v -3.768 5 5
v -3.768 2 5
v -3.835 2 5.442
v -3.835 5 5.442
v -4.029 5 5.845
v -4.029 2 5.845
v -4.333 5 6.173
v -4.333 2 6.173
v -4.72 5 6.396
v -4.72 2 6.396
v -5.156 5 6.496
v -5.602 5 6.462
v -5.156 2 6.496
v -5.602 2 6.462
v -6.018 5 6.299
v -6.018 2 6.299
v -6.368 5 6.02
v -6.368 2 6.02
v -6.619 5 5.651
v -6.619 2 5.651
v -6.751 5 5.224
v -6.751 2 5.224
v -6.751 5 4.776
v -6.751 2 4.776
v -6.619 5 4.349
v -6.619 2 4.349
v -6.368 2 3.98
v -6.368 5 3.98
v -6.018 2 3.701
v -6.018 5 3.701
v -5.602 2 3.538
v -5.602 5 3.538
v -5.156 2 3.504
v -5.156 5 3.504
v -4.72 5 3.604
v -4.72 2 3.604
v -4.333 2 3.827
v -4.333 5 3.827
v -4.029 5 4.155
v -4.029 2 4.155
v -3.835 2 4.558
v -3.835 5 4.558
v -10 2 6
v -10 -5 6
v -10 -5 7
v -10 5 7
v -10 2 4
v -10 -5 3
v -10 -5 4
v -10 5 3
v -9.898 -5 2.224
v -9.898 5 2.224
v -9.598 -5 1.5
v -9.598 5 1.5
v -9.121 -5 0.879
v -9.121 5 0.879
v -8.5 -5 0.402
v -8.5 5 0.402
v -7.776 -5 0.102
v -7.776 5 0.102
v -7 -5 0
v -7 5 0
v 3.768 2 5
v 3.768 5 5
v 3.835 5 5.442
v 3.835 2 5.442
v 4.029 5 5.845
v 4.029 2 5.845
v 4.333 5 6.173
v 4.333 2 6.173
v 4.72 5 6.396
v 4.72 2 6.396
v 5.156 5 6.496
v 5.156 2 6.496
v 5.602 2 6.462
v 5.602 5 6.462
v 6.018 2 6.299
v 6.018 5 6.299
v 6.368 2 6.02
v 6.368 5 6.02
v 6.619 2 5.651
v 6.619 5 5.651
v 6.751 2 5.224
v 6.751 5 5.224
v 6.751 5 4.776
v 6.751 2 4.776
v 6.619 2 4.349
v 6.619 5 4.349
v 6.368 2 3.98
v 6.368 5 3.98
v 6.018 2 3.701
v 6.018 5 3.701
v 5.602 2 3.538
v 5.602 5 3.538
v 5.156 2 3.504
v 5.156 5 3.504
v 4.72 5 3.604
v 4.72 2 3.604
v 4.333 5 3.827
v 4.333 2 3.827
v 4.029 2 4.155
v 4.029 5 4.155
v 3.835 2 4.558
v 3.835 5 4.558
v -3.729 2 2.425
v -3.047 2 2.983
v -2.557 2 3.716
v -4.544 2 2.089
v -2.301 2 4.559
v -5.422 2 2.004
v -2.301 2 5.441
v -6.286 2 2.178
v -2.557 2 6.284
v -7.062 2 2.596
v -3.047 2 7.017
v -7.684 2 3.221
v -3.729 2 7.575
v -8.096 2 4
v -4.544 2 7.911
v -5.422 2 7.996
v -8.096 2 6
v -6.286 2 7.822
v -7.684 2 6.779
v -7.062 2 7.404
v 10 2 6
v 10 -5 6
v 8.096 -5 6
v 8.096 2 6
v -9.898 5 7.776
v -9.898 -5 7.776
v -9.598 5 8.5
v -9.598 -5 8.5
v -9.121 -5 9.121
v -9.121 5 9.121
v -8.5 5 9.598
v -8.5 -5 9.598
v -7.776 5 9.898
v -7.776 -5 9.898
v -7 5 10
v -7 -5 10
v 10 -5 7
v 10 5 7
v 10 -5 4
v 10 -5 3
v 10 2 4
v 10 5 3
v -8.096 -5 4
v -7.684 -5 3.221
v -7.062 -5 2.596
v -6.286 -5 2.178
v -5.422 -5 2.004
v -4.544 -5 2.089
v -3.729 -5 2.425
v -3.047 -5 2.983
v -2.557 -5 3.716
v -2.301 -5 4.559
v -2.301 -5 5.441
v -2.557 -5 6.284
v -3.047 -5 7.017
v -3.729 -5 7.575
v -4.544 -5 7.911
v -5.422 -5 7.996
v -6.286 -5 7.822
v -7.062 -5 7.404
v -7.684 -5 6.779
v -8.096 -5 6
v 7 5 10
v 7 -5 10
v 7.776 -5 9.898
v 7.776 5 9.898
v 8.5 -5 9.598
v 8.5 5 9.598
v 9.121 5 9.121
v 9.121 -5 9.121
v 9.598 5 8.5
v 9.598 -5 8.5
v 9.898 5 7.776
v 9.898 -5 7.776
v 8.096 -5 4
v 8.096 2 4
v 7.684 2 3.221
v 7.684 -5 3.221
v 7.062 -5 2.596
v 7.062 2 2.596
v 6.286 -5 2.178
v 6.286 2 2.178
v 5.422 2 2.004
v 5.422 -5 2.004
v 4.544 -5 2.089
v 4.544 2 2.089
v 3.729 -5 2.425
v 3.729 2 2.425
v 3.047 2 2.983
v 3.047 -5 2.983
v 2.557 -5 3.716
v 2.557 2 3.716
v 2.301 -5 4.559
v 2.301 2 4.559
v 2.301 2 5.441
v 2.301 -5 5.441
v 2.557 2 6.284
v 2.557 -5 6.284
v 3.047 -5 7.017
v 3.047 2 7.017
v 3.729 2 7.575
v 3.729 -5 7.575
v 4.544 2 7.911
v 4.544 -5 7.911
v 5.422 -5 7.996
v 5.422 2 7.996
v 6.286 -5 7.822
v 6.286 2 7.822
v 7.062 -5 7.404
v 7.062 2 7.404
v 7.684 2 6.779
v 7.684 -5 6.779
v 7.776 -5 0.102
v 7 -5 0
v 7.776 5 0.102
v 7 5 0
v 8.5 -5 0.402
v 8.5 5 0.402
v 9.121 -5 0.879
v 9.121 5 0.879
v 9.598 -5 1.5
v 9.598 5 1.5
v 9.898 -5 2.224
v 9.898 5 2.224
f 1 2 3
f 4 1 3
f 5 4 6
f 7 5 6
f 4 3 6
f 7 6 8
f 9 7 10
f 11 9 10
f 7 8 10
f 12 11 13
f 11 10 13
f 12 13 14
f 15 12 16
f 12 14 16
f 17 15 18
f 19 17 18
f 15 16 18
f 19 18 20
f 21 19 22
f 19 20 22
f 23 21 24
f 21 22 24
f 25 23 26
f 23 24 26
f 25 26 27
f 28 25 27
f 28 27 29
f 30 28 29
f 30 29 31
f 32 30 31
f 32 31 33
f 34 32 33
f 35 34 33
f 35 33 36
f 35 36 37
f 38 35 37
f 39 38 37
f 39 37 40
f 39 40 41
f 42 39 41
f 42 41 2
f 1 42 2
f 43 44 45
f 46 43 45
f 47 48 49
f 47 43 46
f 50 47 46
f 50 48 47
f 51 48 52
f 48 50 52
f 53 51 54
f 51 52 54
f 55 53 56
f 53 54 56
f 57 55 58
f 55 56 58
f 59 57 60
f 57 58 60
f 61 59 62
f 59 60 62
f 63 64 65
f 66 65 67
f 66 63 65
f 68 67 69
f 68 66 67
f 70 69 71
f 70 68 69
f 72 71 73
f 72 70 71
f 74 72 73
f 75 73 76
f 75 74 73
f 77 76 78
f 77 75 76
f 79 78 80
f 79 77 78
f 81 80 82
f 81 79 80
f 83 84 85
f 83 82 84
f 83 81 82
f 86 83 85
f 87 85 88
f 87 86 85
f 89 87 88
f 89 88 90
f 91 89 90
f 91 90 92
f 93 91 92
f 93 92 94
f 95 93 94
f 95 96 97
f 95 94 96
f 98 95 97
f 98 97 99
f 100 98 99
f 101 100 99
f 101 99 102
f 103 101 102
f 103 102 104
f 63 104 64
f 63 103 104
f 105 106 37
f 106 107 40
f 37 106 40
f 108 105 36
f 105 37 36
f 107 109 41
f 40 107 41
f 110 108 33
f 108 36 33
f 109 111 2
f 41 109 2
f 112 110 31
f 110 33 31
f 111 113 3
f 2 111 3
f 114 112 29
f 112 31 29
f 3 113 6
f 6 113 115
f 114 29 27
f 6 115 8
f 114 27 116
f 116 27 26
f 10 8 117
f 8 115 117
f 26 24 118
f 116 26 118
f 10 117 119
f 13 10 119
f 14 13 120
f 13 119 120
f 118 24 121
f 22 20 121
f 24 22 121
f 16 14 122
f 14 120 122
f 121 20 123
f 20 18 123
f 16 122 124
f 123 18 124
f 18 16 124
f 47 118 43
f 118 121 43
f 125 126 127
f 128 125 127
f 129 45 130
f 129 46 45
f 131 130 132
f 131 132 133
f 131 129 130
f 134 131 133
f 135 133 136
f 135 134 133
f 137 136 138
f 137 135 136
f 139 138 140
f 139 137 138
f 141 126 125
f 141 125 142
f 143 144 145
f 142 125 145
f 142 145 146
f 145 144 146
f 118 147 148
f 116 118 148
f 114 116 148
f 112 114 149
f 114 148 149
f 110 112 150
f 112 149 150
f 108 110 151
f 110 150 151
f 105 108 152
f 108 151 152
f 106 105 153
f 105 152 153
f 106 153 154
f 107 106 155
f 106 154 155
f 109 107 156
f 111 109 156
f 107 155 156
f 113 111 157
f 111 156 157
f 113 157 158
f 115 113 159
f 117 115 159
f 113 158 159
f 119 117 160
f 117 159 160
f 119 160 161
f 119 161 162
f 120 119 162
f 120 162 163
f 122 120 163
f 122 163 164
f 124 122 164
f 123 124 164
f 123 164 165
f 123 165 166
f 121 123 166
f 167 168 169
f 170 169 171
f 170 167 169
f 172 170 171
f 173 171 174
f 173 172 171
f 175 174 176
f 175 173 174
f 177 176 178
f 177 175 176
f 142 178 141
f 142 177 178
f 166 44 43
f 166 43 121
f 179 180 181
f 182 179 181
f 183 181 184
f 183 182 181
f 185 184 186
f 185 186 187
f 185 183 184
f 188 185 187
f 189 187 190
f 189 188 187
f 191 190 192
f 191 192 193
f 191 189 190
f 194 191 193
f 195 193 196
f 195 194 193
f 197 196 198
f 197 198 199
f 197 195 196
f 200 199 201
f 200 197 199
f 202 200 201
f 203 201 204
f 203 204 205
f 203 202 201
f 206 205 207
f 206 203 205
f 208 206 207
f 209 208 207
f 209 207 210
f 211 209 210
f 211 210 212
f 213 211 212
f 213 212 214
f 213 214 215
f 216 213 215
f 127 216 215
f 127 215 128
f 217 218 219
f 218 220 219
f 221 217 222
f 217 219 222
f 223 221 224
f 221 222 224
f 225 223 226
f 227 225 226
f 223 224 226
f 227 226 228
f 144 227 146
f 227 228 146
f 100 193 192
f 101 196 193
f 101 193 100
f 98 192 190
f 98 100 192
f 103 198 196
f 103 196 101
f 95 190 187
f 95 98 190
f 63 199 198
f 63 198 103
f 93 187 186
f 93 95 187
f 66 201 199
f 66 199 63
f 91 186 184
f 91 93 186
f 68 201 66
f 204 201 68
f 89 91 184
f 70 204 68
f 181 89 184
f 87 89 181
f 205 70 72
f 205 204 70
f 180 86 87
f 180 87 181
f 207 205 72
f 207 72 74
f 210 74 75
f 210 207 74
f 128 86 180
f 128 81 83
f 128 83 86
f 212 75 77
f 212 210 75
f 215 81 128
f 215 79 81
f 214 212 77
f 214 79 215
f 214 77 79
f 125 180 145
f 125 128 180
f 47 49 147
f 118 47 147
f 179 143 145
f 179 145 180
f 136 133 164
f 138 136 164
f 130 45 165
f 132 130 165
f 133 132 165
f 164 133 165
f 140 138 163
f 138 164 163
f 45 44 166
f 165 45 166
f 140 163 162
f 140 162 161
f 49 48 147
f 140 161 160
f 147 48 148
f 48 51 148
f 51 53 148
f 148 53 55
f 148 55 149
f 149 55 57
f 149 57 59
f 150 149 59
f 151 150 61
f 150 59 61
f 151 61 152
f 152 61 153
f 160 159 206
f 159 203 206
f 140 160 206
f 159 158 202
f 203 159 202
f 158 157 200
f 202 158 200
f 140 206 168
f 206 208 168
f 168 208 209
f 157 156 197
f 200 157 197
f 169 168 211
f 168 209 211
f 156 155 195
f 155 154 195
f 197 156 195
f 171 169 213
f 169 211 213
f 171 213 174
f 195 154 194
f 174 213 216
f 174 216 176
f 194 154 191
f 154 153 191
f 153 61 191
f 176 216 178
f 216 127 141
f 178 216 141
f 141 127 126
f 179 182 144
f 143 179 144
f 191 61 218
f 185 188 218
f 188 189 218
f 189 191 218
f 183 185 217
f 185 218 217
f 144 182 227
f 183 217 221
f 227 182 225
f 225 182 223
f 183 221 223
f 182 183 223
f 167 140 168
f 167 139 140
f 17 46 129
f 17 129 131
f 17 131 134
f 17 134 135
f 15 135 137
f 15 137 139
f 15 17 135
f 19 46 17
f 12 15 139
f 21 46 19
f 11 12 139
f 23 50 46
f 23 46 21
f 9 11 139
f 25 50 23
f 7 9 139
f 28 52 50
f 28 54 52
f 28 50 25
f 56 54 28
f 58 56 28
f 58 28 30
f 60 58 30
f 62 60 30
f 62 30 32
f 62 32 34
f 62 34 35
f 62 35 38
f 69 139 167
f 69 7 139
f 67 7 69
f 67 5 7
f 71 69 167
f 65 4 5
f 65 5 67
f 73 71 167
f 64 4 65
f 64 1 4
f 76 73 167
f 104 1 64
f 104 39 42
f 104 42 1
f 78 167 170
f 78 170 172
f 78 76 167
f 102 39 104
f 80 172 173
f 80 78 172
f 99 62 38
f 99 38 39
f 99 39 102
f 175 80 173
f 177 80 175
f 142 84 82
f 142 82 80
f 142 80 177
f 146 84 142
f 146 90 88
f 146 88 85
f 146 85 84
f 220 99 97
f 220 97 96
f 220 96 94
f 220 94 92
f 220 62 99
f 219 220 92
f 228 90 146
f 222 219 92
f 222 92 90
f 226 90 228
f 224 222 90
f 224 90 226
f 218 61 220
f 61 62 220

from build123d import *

# Parameters (mm, degrees)
SKETCH_W        = 20
SKETCH_H        = 10
PAD_DEPTH       = 10
POCKET_DEPTH    = 7
SKETCH002_R     = 3
POCKET001_DEPTH = 7
SKETCH003_R     = 1.5
POCKET002_DEPTH = 5
FILLET_R        = 3


with BuildPart() as part:
    # Sketch → Pad (new body)
    with BuildSketch(Plane.XY):
        Rectangle(SKETCH_W, SKETCH_H)
    extrude(amount=PAD_DEPTH)

    # Sketch001 (on Face1 of Pad) → Pocket (cut)
    with BuildSketch(Plane.XZ.offset(5)):
        with BuildLine():
            Line((-10, 4), (-10, 6))
            Line((-10, 6), (-7, 6))
            ThreePointArc((-7, 4), (-3.267949, 5), (-7, 6))
            Line((-10, 4), (-7, 4))
        make_face()
    pocket = extrude(amount=-POCKET_DEPTH, mode=Mode.SUBTRACT)

    # Sketch002 (on Face1 of Pocket) → Pocket001 (cut)
    with BuildSketch(Plane.XZ.offset(5)):
        with Locations((-5.267949, 5)):
            Circle(SKETCH002_R)
    pocket001 = extrude(amount=-POCKET001_DEPTH, mode=Mode.SUBTRACT)

    # Sketch003 (on Face9 of Pocket001) → Pocket002 (cut)
    with BuildSketch(Plane.XZ.offset(-2)):
        with Locations((-5.267949, 5)):
            Circle(SKETCH003_R)
    pocket002 = extrude(amount=-POCKET002_DEPTH, mode=Mode.SUBTRACT)

    # Mirrored: Pocket, Pocket001, Pocket002 across Sketch001 V_Axis
    add(pocket.mirror(Plane(origin=(0, -5, 0), x_dir=(0, -1, 0), z_dir=(1, 0, 0))), mode=Mode.SUBTRACT)
    add(pocket001.mirror(Plane(origin=(0, -5, 0), x_dir=(0, -1, 0), z_dir=(1, 0, 0))), mode=Mode.SUBTRACT)
    add(pocket002.mirror(Plane(origin=(0, -5, 0), x_dir=(0, -1, 0), z_dir=(1, 0, 0))), mode=Mode.SUBTRACT)

    # Fillet
    fillet_edges = [part.edges().sort_by_distance(p)[0] for p in [
        (-10, 0, 10),
        (-10, 0, 0),
        (10, 0, 10),
        (10, 0, 0),
    ]]
    fillet(fillet_edges, radius=FILLET_R)


solid = part.part
